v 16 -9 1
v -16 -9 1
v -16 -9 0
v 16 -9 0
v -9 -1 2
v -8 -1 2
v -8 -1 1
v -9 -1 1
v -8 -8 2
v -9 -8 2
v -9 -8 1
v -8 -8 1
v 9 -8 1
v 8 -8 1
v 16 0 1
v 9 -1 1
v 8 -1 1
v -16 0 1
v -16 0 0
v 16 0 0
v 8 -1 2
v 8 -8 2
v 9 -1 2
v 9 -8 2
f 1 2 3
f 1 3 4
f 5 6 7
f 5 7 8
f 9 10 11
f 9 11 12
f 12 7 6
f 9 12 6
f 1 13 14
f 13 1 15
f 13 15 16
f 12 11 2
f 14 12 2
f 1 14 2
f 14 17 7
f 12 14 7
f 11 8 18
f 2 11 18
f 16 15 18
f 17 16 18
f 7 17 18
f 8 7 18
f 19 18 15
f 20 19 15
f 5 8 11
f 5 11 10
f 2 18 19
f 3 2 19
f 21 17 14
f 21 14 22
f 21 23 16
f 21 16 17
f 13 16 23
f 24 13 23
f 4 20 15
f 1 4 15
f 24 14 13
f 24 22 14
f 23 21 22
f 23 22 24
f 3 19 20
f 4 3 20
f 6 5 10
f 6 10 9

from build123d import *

# Parameters (mm, degrees)
F0_W     = 1
F0_H     = 1
F1_DEPTH = 9
F2_W     = 1
F2_H     = 1
F3_DEPTH = 1
F4_W     = 1
F4_H     = 1
F5_DEPTH = 1


with BuildPart() as f1:
    # F0 (on Front) → F1 (new body)
    with BuildSketch(Plane.XZ):
        Polygon((-9, 1), (-16, 1), (-16, 0), (16, 0), (16, 1), (9, 1), (8, 1), (-8, 1), align=None)
        with Locations((-8.5, 1.5)):
            Rectangle(F0_W, F0_H)
        with Locations((8.5, 1.5)):
            Rectangle(F0_W, F0_H)
    extrude(amount=F1_DEPTH)

    # F2 (on face) → F3 (cut)
    with BuildSketch(Plane.XZ.offset(9)):
        Polygon((-9.9123697728, 3.1492931303), (-9.9123697728, 1), (-9, 1), (-9, 2), (-8, 2), (-8, 1), (8, 1), (8, 2), (9, 2), (9, 1), (10.0291045383, 1), (10.0291045383, 3.1492931303), align=None)
        with Locations((-8.5, 1.5)):
            Rectangle(F2_W, F2_H)
        with Locations((8.5, 1.5)):
            Rectangle(F2_W, F2_H)
    extrude(amount=-F3_DEPTH, mode=Mode.SUBTRACT)

    # F4 (on face) → F5 (cut)
    with BuildSketch(Plane(origin=(0, 0, 0), x_dir=(-1, 0, 0), z_dir=(0, 1, 0))):
        with Locations((-8.5, 1.5)):
            Rectangle(F4_W, F4_H)
        with Locations((8.5, 1.5)):
            Rectangle(F4_W, F4_H)
    extrude(amount=-F5_DEPTH, mode=Mode.SUBTRACT)


solid = f1.part
